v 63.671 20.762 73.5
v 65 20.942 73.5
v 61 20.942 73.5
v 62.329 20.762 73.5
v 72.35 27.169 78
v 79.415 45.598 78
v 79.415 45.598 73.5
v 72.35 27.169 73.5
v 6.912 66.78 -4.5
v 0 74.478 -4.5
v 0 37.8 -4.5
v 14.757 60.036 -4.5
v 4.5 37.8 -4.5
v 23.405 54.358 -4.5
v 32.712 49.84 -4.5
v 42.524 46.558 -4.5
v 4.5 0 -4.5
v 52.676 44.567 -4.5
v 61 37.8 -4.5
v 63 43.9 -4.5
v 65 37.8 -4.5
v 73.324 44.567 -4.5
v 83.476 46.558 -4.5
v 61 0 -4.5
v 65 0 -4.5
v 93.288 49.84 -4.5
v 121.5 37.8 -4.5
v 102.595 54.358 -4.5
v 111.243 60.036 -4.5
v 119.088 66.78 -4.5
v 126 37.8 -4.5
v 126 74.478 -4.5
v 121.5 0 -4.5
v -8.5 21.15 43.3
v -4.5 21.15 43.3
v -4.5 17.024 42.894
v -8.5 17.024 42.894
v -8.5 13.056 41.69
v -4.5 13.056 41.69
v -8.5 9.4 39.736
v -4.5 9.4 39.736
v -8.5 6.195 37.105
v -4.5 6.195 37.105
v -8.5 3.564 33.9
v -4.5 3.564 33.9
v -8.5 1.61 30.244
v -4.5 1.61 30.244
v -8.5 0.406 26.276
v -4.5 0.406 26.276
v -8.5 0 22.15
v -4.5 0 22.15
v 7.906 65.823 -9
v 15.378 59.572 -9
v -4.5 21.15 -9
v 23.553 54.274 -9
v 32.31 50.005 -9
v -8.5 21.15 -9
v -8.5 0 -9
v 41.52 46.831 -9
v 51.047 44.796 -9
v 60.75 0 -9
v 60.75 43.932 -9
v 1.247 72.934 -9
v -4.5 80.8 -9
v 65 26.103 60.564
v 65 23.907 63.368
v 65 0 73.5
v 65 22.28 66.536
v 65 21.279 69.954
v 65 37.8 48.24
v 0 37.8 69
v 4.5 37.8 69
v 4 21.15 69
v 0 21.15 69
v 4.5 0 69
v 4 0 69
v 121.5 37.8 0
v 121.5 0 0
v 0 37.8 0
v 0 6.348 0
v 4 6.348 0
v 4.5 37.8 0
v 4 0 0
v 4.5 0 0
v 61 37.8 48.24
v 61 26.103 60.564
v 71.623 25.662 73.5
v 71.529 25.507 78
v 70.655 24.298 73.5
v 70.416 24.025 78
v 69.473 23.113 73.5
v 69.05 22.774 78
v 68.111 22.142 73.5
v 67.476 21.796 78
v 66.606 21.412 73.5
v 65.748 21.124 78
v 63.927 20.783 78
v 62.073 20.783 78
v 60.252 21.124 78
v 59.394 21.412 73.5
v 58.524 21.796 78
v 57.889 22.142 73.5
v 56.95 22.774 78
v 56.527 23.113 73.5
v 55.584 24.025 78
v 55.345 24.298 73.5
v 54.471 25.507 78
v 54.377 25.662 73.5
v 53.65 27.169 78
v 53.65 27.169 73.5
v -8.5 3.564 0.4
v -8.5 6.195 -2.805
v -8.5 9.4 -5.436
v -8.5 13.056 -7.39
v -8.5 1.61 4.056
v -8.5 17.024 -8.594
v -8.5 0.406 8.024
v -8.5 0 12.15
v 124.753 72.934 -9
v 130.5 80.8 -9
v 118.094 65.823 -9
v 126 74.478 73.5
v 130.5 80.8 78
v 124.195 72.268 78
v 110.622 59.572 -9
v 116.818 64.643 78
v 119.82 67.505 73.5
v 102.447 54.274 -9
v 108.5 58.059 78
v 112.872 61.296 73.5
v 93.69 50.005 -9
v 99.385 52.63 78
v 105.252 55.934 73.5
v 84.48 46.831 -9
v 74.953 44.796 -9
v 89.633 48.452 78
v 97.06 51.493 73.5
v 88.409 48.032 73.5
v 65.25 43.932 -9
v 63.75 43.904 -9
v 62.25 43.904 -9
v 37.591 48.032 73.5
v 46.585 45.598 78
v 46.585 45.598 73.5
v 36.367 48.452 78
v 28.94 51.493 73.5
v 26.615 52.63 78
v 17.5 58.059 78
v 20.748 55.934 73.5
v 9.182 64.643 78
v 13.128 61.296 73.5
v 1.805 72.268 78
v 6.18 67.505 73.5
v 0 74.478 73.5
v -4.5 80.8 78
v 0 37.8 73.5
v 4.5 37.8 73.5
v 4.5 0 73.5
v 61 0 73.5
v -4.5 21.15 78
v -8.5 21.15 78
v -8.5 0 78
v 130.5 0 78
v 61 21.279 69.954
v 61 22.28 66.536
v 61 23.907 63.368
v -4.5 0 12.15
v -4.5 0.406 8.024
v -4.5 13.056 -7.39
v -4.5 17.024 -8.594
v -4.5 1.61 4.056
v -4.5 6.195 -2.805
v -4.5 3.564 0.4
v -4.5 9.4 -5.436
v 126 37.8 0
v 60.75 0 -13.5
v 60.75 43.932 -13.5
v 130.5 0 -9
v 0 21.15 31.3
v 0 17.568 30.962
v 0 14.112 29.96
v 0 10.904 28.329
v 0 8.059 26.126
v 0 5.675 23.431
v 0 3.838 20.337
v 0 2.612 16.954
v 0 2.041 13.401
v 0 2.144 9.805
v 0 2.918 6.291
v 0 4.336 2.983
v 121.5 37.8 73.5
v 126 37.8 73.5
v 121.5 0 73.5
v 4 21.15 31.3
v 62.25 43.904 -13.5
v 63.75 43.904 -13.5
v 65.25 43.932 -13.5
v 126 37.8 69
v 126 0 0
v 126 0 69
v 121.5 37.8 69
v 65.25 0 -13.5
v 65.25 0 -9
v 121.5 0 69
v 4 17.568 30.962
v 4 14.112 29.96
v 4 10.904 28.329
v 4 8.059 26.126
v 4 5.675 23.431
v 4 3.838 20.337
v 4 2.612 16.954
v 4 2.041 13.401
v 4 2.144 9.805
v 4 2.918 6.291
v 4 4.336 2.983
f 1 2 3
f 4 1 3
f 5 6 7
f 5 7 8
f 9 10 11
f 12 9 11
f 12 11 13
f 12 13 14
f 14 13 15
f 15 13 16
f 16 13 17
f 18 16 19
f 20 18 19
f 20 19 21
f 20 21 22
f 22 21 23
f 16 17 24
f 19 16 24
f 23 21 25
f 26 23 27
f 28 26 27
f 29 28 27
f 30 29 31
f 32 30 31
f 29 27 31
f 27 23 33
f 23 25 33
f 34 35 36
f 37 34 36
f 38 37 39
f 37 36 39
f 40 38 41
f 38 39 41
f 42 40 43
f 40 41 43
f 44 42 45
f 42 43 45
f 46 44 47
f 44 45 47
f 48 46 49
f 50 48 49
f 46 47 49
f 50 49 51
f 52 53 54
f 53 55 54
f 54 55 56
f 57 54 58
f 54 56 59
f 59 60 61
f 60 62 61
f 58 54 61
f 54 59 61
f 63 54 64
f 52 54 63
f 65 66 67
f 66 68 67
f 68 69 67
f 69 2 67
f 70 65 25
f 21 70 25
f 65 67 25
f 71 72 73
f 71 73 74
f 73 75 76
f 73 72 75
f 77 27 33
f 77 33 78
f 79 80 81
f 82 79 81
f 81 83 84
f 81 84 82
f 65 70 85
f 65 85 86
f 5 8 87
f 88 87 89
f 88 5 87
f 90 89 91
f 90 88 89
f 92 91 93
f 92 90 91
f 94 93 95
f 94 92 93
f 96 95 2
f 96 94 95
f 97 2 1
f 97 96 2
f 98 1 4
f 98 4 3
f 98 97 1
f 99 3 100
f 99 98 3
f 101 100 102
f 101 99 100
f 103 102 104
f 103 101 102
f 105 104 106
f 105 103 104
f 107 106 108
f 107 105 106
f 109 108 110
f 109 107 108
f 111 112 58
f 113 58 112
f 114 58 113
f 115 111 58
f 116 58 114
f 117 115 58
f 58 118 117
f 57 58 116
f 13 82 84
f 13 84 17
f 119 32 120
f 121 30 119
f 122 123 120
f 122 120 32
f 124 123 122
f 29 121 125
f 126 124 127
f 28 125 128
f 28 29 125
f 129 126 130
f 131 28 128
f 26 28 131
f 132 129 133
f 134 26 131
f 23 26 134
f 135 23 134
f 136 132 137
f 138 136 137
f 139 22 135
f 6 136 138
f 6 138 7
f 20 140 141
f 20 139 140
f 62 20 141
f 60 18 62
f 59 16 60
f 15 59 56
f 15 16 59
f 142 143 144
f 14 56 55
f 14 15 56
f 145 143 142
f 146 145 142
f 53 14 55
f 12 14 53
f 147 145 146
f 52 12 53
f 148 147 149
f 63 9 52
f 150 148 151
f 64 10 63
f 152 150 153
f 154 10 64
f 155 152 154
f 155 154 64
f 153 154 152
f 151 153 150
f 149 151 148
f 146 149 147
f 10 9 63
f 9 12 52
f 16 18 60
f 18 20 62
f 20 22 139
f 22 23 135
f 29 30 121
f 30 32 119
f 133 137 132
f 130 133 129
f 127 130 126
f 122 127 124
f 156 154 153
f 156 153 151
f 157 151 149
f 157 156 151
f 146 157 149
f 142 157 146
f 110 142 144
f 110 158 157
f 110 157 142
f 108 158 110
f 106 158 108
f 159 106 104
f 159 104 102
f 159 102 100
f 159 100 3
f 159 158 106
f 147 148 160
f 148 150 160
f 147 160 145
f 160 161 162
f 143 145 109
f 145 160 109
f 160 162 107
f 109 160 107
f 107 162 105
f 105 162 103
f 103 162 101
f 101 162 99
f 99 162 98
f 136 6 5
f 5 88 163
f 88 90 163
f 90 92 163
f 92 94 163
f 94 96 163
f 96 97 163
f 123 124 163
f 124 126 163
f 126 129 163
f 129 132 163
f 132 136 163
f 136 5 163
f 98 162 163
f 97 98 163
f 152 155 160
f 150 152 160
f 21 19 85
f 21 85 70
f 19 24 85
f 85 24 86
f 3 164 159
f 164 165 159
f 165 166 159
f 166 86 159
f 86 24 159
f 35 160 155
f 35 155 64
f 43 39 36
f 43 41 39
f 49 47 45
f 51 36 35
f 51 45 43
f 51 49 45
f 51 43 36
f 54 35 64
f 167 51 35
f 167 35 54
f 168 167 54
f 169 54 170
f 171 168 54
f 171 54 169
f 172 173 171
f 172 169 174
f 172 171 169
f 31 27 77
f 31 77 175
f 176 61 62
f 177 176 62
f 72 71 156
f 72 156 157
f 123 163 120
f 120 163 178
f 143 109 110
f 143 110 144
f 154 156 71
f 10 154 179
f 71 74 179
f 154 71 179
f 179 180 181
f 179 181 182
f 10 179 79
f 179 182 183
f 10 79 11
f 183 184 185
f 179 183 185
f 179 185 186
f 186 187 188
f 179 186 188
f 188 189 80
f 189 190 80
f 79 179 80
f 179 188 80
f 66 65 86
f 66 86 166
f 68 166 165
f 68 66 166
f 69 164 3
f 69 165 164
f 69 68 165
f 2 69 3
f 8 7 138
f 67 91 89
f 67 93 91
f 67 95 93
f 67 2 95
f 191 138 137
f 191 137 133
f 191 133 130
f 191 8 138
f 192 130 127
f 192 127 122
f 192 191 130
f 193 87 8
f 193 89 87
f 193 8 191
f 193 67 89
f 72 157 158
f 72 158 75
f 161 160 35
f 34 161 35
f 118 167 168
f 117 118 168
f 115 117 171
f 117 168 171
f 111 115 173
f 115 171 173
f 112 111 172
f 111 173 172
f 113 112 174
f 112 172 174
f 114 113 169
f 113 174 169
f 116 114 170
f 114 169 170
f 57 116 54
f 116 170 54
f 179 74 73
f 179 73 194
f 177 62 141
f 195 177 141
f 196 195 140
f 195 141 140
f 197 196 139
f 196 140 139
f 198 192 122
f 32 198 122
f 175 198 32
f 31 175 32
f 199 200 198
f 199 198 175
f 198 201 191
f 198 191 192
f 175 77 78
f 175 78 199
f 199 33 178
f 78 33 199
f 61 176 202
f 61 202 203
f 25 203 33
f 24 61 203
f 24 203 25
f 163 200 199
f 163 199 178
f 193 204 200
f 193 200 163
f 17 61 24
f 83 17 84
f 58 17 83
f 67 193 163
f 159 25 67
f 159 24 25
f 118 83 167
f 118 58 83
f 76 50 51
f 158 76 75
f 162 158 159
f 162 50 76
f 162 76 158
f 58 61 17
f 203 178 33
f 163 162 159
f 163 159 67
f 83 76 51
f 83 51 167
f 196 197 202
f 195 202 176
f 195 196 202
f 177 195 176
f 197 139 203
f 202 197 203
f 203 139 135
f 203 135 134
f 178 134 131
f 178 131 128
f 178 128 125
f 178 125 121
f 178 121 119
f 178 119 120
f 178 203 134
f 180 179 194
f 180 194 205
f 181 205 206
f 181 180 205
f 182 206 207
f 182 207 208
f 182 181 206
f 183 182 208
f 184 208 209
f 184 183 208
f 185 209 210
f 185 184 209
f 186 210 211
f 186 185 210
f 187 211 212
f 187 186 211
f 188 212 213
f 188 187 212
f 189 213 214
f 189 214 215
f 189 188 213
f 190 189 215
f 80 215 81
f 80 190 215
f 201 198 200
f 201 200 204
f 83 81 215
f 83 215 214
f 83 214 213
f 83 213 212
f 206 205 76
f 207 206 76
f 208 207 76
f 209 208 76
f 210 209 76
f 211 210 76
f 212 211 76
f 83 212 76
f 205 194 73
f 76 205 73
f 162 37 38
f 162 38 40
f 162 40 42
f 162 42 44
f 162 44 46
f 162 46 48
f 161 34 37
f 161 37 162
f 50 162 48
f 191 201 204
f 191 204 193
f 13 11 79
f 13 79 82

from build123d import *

# Parameters (mm, degrees)
SKETCH_1_W          = 135
SKETCH_1_H          = 87
EXTRUDE_1_DEPTH     = 37.8
SKETCH_2_W          = 135
SKETCH_2_H          = 87
SKETCH_2_W_2        = 126
SKETCH_2_H_2        = 78
EXTRUDE_2_DEPTH     = 43
CUT_EXTRUDE_1_DEPTH = 177.430978006
CUT_EXTRUDE_2_DEPTH = 4.5
CUT_EXTRUDE_3_DEPTH = 4.5
EXTRUDE_3_DEPTH     = 4.5
EXTRUDE_4_DEPTH     = 4
EXTRUDE_5_DEPTH     = 4


with BuildPart() as part:
    # 草图1 → 凸台-拉伸1 (new body)
    with BuildSketch(Plane(origin=(0, 0, 0), x_dir=(1, 0, 0), z_dir=(0, 1, 0))):
        with Locations((63, -34.5)):
            Rectangle(SKETCH_1_W, SKETCH_1_H)
        Polygon((0, 0), (4.5, 0), (4.5, 4.5), (61, 4.5), (61, -73.5), (4.5, -73.5), (4.5, -69), (0, -69), align=None, mode=Mode.SUBTRACT)
        Polygon((121.5, 4.5), (121.5, 0), (126, 0), (126, -69), (121.5, -69), (121.5, -73.5), (65, -73.5), (65, 4.5), align=None, mode=Mode.SUBTRACT)
    extrude(amount=EXTRUDE_1_DEPTH)

    # 草图2 → 凸台-拉伸2 (add)
    with BuildSketch(Plane(origin=(0, 37.8, 0), x_dir=(1, 0, 0), z_dir=(0, 1, 0))):
        with Locations((63, -34.5)):
            Rectangle(SKETCH_2_W, SKETCH_2_H)
        with Locations((63, -34.5)):
            Rectangle(SKETCH_2_W_2, SKETCH_2_H_2, mode=Mode.SUBTRACT)
    extrude(amount=EXTRUDE_2_DEPTH)

    # 草图3 → 切除-拉伸1 (cut, through all)
    with BuildSketch(Plane.XY.offset(78)):
        with BuildLine():
            Line((-4.5, 80.8), (130.5, 80.8))
            ThreePointArc((130.5, 80.8), (63, 43.9), (-4.5, 80.8))
        make_face()
    extrude(amount=-CUT_EXTRUDE_1_DEPTH, mode=Mode.SUBTRACT)

    # 草图4 → 切除-拉伸2 (cut)
    with BuildSketch(Plane.XY.offset(78)):
        with BuildLine():
            Line((53.65, 27.169085989), (46.585, 45.598112395))
            Line((46.585, 45.598112395), (79.415, 45.598112395))
            Line((79.415, 45.598112395), (72.35, 27.169085989))
            ThreePointArc((72.35, 27.169085989), (63, 20.74), (53.65, 27.169085989))
        make_face()
    extrude(amount=-CUT_EXTRUDE_2_DEPTH, mode=Mode.SUBTRACT)

    # 草图5 → 切除-拉伸3 (cut)
    with BuildSketch(Plane(origin=(65, 0, 0), x_dir=(0, 0, -1), z_dir=(1, 0, 0))):
        with BuildLine():
            Line((-73.5, 37.8), (-48.24, 37.8))
            Line((-48.24, 37.8), (-60.563675282, 26.103423436))
            ThreePointArc((-60.563675282, 26.103423436), (-66.535963079, 22.279815799), (-73.5, 20.94176249))
            Line((-73.5, 20.94176249), (-73.5, 37.8))
        make_face()
    extrude(amount=-CUT_EXTRUDE_3_DEPTH, mode=Mode.SUBTRACT)

    # 草图6 → 凸台-拉伸3 (add)
    with BuildSketch(Plane(origin=(0, 0, -9), x_dir=(-1, 0, 0), z_dir=(0, 0, -1))):
        with BuildLine():
            Line((-65.25, 0), (-60.75, 0))
            Line((-60.75, 0), (-60.75, 43.931572736))
            ThreePointArc((-60.75, 43.931572736), (-63, 43.9), (-65.25, 43.931572736))
            Line((-65.25, 43.931572736), (-65.25, 0))
        make_face()
    extrude(amount=EXTRUDE_3_DEPTH)

    # 草图7 → 凸台-拉伸4 (add)
    with BuildSketch(Plane.ZY.offset(4.5)):
        with BuildLine():
            Line((-9, 0), (12.15, 0))
            ThreePointArc((12.15, 0), (-2.805308422, 6.194691578), (-9, 21.15))
            Line((-9, 21.15), (-9, 0))
        make_face()
        with BuildLine():
            Line((78, 0), (78, 21.15))
            Line((78, 21.15), (43.3, 21.15))
            ThreePointArc((43.3, 21.15), (37.105308422, 6.194691578), (22.15, 0))
            Line((22.15, 0), (78, 0))
        make_face()
    extrude(amount=EXTRUDE_4_DEPTH)

    # 草图8 → 凸台-拉伸5 (add)
    with BuildSketch(Plane(origin=(0, 0, 0), x_dir=(0, 0, -1), z_dir=(1, 0, 0))):
        with BuildLine():
            Line((0, 6.347973112), (0, 0))
            Line((0, 0), (-31.3, 0))
            Line((-31.3, 0), (-69, 0))
            Line((-69, 0), (-69, 21.15))
            Line((-69, 21.15), (-31.3, 21.15))
            ThreePointArc((-31.3, 21.15), (-20.336879747, 3.83822655), (0, 6.347973112))
        make_face()
    extrude(amount=EXTRUDE_5_DEPTH)


solid = part.part
